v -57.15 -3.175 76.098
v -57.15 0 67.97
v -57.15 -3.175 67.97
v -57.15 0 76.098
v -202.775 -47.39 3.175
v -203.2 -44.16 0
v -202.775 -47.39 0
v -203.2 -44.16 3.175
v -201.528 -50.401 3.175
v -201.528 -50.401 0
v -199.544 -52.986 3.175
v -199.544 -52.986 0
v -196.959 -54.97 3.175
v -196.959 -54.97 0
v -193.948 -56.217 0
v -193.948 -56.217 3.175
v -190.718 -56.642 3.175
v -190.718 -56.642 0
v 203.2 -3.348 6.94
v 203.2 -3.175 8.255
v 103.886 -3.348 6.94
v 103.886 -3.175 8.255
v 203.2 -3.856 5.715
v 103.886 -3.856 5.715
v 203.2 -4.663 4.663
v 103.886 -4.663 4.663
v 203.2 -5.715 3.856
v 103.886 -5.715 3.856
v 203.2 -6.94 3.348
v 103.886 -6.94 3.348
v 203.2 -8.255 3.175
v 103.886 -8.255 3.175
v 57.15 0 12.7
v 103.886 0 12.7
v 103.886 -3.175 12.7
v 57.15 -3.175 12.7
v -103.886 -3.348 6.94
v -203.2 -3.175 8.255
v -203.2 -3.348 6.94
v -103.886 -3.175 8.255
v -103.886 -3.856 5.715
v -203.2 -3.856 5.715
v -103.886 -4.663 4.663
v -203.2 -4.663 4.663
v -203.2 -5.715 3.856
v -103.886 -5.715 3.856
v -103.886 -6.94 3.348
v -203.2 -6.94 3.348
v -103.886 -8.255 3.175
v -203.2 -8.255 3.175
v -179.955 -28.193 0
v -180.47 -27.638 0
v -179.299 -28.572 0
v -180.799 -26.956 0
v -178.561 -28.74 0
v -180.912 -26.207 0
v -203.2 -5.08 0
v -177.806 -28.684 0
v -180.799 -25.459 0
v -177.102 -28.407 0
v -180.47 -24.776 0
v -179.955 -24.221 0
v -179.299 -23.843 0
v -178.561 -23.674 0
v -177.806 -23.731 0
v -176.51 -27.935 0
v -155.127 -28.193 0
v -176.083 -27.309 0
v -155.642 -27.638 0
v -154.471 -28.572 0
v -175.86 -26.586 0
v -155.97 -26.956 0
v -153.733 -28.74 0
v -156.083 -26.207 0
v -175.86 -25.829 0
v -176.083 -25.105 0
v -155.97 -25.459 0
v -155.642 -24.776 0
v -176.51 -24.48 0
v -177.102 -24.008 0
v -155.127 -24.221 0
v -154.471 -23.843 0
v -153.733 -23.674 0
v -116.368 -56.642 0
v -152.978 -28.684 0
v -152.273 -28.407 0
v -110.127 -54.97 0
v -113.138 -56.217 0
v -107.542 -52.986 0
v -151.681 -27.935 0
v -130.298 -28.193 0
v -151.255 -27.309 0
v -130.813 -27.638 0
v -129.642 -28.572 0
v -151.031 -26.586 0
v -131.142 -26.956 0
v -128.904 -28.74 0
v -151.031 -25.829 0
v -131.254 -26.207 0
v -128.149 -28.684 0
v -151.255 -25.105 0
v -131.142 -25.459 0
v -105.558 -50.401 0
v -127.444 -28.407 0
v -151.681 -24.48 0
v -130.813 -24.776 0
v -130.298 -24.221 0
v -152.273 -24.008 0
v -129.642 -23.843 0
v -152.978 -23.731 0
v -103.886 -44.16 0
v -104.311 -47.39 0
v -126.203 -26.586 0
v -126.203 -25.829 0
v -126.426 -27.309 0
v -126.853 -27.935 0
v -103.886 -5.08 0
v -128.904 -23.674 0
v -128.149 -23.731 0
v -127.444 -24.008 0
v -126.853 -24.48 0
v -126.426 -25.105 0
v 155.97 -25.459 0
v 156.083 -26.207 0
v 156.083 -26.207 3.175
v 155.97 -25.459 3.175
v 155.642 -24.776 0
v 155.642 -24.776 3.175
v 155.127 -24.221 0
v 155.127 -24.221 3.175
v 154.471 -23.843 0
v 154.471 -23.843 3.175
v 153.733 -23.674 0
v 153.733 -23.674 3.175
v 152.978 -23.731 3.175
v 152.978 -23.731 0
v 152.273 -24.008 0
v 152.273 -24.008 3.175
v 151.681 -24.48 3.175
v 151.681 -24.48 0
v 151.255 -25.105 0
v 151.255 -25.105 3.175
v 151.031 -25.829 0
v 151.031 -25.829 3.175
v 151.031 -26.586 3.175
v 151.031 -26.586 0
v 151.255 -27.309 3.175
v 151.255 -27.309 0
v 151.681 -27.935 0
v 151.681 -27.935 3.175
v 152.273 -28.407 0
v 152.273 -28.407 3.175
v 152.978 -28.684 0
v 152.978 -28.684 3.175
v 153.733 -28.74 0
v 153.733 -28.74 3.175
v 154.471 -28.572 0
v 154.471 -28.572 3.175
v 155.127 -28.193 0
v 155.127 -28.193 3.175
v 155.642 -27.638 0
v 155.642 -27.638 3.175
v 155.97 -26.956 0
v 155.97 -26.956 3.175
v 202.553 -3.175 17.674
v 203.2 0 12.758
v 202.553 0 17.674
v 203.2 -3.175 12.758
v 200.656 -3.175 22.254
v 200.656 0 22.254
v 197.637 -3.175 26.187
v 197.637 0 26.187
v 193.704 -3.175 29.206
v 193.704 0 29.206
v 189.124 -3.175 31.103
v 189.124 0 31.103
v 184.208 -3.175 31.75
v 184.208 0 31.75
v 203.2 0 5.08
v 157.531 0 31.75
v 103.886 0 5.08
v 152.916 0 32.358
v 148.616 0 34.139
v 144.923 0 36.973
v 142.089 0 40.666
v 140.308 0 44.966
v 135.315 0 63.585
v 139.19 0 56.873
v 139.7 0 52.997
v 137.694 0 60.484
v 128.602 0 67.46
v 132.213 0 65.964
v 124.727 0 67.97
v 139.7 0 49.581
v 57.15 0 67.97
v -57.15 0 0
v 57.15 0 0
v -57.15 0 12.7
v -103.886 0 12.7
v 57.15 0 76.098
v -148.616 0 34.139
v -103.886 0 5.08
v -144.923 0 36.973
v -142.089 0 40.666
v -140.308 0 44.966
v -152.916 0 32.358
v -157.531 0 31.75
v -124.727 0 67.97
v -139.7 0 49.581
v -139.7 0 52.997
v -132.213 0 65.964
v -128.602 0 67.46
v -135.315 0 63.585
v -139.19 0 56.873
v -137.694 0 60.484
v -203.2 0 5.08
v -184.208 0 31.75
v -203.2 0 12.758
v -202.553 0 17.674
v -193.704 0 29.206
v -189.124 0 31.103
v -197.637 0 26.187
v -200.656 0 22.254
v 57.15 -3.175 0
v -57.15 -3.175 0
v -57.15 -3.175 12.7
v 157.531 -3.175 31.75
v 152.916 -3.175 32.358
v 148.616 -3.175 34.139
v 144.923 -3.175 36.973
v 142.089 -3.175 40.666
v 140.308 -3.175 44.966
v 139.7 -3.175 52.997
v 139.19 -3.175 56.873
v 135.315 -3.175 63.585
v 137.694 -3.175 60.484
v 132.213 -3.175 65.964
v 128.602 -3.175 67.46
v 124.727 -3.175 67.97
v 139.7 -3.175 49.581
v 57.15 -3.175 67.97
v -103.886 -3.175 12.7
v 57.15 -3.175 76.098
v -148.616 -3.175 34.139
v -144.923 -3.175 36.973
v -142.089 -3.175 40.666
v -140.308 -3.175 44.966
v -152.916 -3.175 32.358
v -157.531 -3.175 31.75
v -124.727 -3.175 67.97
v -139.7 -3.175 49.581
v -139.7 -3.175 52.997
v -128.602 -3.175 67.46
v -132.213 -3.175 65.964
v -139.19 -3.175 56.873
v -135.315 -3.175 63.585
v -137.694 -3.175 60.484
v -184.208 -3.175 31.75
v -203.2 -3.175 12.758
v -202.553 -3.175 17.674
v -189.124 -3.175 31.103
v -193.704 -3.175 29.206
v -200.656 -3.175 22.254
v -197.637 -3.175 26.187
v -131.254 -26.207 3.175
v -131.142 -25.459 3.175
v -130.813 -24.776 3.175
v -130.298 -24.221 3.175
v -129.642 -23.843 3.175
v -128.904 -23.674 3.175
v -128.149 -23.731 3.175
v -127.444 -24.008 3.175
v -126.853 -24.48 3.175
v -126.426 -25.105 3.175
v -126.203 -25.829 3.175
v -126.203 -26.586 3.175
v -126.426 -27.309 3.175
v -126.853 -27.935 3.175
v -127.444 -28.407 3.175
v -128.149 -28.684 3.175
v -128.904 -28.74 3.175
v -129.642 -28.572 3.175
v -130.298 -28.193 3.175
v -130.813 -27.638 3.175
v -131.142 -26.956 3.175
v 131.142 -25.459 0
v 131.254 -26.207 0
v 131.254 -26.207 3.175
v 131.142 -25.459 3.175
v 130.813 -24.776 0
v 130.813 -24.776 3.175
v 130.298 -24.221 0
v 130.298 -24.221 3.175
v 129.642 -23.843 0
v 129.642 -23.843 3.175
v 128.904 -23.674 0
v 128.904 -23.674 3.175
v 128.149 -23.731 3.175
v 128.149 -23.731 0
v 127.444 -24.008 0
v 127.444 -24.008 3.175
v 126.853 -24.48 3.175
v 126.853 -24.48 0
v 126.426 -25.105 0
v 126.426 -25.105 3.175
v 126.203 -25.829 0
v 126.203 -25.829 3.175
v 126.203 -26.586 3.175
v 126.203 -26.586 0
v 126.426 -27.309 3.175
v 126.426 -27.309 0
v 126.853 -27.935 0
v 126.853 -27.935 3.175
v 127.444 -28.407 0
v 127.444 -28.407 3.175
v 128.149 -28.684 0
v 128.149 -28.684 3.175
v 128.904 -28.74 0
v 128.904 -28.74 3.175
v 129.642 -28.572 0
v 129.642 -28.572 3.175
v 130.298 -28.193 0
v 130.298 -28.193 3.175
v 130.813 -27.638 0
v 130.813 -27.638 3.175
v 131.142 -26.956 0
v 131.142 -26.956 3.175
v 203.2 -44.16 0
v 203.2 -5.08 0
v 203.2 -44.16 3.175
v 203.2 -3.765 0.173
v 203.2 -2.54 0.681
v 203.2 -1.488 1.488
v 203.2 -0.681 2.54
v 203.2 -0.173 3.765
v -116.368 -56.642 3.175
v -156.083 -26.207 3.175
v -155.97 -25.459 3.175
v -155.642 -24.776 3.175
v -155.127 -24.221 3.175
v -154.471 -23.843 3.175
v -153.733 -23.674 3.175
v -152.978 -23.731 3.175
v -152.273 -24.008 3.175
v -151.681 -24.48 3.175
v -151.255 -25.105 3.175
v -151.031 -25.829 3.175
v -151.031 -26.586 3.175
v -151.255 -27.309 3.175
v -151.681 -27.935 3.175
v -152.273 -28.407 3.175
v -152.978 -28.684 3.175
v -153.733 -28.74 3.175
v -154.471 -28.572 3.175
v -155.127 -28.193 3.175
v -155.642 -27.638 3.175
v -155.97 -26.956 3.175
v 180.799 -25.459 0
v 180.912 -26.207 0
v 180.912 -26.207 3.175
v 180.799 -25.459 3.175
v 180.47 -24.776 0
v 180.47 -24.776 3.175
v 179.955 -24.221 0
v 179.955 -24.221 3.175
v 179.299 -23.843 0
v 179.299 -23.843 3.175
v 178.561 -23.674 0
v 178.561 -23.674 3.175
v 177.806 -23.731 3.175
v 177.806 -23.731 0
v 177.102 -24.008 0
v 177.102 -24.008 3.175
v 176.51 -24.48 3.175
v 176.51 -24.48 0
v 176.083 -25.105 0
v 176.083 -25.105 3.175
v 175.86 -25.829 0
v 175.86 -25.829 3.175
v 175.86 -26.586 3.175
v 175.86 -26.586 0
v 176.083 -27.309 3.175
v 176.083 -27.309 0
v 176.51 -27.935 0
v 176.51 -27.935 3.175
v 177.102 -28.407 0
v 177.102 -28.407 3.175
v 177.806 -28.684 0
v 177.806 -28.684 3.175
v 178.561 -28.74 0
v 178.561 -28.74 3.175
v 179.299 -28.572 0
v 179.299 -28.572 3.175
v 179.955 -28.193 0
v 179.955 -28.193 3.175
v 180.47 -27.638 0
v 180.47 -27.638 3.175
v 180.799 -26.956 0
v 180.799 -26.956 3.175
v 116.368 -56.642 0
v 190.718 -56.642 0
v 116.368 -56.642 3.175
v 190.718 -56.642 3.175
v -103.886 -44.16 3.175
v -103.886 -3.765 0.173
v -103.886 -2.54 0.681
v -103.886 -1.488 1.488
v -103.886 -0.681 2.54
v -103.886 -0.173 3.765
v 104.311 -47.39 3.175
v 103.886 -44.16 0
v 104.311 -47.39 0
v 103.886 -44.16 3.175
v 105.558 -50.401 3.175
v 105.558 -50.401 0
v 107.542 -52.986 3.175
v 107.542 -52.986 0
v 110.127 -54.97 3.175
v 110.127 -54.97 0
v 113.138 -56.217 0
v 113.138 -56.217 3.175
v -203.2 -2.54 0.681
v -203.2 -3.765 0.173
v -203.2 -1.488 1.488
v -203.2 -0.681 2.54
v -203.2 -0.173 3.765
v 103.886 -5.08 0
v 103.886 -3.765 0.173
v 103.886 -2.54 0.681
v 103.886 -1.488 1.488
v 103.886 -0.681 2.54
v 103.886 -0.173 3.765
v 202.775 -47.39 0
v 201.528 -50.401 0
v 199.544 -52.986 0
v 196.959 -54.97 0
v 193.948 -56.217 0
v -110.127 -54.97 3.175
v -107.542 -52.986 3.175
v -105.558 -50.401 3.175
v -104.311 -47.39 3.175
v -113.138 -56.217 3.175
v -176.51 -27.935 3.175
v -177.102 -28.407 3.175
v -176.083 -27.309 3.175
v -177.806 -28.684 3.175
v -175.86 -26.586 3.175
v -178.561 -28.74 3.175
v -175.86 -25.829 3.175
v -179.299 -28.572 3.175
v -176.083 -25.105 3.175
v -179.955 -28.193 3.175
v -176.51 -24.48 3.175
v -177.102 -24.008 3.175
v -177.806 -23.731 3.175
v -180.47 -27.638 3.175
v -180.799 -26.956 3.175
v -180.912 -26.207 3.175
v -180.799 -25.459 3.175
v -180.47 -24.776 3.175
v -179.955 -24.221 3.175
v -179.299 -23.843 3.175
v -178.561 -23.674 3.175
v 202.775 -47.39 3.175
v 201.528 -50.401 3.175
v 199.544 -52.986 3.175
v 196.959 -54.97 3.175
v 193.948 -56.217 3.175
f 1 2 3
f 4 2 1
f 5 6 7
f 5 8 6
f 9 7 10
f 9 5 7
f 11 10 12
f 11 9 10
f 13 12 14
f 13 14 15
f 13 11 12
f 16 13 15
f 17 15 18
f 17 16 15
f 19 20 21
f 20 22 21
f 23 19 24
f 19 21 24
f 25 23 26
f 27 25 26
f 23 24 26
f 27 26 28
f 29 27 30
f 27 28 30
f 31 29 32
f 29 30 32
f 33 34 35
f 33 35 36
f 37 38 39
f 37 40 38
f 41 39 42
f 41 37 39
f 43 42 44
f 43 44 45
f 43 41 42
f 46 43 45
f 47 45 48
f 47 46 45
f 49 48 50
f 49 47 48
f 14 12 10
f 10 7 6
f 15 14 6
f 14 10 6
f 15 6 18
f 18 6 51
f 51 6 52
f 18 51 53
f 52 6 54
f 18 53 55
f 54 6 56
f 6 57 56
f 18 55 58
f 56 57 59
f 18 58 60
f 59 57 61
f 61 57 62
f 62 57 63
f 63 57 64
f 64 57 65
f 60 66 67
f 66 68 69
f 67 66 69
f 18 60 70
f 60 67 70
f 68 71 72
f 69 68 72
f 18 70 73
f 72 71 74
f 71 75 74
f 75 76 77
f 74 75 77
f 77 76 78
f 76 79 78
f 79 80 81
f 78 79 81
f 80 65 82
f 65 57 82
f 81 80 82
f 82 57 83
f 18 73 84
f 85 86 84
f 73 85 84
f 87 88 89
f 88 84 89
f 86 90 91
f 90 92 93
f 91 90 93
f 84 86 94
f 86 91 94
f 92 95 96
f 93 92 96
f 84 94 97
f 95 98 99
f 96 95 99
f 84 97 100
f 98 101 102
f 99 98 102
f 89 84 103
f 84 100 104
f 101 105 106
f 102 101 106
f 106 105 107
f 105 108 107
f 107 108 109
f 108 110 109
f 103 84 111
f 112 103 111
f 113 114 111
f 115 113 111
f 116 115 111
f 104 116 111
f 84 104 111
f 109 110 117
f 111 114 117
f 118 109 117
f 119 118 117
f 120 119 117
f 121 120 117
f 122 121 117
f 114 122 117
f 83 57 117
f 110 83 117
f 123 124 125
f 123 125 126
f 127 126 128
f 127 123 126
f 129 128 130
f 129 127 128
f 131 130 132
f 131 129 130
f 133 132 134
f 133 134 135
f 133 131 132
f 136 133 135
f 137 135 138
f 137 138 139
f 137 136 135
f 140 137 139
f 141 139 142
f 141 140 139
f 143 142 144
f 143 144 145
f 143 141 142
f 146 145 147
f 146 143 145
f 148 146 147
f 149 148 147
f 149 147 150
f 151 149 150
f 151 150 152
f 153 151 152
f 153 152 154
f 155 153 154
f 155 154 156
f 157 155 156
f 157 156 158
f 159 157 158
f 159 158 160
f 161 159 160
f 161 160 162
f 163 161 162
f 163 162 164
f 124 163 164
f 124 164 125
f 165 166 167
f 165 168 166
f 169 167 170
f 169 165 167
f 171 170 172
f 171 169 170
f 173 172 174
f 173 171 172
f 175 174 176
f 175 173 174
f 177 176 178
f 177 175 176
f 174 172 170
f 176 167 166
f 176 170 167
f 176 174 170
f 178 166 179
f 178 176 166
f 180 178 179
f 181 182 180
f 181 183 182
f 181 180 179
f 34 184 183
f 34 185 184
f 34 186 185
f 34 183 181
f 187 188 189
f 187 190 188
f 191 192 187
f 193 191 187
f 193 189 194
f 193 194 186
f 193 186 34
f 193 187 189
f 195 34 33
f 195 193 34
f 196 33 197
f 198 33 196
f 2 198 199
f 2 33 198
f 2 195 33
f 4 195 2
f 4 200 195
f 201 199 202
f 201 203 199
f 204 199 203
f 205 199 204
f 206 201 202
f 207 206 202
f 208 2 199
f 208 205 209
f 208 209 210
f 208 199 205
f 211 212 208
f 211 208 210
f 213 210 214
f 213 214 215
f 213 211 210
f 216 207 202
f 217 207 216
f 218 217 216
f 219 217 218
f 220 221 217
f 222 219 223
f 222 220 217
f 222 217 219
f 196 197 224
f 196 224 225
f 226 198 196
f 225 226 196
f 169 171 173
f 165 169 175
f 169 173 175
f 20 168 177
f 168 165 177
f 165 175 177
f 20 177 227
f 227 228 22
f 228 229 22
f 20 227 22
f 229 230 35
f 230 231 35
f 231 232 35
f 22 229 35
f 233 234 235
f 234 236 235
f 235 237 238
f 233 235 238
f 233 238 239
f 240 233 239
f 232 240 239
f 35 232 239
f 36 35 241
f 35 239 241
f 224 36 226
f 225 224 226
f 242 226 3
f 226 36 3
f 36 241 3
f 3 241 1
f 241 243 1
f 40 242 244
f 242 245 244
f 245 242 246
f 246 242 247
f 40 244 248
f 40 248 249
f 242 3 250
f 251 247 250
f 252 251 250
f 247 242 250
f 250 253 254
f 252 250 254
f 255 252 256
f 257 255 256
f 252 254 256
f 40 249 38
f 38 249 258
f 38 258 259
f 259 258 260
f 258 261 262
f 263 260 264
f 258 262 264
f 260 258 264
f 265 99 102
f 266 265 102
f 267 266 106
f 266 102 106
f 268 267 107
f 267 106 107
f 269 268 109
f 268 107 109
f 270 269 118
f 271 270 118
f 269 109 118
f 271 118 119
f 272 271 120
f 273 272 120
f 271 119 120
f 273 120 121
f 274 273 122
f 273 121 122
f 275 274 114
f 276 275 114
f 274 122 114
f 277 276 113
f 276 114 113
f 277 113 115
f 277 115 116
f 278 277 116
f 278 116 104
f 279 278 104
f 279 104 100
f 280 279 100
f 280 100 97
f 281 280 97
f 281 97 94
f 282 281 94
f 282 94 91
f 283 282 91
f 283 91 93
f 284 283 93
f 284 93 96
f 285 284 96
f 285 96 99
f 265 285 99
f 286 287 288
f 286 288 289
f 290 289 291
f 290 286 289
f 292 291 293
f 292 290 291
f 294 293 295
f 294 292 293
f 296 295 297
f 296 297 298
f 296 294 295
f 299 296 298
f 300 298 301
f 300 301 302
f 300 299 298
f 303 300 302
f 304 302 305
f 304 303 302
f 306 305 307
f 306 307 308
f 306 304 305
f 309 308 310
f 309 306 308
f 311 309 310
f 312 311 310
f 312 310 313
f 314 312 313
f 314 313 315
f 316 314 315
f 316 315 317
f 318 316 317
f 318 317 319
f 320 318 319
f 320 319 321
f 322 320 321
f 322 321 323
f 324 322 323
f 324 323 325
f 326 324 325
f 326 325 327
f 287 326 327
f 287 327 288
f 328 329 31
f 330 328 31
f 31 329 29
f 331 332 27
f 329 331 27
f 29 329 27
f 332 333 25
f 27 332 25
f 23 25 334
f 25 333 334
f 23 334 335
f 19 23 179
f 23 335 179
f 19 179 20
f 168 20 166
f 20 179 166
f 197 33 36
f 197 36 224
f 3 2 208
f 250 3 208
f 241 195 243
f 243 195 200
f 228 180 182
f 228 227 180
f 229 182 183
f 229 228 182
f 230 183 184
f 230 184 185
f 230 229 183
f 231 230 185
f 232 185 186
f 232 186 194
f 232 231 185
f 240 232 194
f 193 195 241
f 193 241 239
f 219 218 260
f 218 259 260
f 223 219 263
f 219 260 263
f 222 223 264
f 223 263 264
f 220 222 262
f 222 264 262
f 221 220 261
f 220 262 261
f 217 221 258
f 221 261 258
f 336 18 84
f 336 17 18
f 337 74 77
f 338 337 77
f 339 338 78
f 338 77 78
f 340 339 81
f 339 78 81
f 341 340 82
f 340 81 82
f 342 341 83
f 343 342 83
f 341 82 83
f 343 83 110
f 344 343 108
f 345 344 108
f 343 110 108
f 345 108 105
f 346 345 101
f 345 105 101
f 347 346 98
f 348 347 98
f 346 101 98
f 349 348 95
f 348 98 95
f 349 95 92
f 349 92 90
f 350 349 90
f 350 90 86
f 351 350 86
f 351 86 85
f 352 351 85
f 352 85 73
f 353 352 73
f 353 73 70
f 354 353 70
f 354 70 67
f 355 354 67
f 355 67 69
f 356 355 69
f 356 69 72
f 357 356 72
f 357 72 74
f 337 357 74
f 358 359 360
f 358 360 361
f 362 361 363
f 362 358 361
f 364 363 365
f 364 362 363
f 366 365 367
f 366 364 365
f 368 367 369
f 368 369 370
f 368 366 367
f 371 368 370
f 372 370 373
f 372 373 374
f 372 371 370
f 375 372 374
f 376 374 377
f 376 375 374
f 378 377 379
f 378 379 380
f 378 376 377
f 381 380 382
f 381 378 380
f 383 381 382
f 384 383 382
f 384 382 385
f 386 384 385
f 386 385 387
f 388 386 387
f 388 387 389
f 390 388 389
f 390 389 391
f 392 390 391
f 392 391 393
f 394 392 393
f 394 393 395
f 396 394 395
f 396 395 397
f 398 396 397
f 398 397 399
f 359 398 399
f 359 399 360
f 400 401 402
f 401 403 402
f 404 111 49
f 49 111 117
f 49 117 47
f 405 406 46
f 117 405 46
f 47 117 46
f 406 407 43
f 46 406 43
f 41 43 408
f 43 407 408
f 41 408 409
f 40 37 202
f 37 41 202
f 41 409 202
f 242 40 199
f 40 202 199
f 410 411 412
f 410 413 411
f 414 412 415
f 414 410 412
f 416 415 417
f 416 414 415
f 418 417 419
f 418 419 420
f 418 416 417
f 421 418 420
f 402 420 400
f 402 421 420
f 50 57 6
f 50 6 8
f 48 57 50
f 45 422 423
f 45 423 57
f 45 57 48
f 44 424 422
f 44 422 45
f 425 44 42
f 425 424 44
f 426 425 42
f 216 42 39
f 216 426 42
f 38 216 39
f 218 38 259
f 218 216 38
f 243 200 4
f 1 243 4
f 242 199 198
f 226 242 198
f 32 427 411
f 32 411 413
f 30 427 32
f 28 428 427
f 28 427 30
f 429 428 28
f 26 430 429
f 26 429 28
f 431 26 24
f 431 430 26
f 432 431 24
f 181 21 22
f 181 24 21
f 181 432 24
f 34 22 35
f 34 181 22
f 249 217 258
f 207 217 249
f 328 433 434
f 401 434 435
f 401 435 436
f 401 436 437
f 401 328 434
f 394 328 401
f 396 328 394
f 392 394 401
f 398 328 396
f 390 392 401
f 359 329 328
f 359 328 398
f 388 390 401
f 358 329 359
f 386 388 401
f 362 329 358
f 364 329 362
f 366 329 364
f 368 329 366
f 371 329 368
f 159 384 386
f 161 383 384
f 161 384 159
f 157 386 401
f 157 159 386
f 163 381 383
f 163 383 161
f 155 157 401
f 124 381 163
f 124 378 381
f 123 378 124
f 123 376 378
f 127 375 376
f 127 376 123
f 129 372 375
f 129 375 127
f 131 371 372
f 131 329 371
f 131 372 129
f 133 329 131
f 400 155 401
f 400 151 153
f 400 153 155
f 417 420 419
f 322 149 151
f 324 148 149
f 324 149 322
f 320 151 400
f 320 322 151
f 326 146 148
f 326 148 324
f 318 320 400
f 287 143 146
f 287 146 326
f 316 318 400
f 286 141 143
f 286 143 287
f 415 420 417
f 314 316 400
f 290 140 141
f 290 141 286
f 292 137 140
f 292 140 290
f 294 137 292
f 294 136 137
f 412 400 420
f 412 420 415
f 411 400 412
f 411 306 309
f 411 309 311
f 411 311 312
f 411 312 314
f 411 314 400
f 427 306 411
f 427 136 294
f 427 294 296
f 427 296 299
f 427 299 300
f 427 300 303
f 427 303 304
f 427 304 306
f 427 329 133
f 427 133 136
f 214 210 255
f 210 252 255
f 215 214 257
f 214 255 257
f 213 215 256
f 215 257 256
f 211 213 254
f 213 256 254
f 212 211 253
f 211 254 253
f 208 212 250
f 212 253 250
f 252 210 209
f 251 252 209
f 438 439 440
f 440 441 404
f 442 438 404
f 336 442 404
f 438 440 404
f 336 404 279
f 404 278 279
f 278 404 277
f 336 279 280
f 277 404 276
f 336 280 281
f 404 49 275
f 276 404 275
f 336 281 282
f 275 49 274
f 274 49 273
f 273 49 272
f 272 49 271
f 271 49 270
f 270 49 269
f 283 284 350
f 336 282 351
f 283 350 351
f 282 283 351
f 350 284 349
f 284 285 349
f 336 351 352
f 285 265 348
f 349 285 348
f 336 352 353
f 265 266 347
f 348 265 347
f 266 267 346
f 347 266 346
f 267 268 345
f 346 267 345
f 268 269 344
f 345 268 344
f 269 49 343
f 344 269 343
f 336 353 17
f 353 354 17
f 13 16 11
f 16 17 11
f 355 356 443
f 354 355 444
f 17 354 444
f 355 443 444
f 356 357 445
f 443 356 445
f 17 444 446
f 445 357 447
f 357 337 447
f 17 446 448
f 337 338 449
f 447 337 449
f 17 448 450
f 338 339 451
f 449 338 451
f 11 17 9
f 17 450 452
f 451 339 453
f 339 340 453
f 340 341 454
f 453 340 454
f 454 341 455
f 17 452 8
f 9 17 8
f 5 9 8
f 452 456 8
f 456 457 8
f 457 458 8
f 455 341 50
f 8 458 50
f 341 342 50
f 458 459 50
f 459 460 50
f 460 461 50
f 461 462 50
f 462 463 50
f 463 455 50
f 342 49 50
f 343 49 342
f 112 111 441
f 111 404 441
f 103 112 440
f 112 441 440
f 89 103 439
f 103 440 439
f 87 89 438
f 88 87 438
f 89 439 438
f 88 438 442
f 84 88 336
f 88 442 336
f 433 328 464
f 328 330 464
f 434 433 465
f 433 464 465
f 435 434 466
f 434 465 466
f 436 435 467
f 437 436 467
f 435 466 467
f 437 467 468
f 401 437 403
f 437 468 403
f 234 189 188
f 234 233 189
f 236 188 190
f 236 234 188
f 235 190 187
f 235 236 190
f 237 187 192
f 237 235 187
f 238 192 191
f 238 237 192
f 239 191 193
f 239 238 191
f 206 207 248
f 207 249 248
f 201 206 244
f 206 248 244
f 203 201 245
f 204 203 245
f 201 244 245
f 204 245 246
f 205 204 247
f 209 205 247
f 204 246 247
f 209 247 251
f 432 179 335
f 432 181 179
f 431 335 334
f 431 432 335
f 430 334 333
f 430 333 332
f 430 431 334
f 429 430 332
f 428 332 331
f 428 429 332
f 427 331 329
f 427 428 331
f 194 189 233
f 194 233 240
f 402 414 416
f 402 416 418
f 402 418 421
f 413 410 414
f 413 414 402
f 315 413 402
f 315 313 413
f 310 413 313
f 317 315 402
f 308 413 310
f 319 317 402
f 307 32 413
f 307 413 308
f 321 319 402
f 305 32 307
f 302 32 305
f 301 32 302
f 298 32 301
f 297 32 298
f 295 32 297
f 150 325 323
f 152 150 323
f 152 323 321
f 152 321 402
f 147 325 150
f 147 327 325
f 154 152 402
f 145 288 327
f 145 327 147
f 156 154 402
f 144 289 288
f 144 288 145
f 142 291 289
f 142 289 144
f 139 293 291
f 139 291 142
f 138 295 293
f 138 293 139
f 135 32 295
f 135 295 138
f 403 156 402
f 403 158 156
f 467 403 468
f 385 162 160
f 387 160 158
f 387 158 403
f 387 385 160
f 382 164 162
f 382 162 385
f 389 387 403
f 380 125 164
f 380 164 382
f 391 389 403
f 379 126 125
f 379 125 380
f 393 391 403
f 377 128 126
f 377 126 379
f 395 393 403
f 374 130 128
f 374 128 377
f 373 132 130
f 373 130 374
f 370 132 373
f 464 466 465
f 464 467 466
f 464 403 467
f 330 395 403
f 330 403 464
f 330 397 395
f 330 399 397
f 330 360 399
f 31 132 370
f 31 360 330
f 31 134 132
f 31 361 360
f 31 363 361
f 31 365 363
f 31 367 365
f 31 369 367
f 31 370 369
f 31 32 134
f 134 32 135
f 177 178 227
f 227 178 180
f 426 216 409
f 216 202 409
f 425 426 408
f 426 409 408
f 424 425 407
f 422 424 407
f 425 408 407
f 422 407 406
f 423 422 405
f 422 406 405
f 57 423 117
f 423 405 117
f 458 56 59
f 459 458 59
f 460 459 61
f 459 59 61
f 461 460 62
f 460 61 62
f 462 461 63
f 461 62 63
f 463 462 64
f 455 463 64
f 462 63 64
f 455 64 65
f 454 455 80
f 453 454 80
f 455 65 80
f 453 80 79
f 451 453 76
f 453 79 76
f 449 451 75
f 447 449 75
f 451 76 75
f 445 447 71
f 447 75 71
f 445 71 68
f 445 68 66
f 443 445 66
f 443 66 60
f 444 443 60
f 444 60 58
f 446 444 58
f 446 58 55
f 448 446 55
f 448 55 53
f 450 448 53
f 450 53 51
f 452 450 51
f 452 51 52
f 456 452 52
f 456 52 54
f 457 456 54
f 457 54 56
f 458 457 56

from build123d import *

# Parameters (mm, degrees)
F0_W     = 63.5
F0_H     = 28.575
F0_W_2   = 46.736
F0_H_2   = 27.6352
F0_W_3   = 57.15
F0_H_3   = 8.128
F1_DEPTH = 3.175
F0_H_4   = 3.175
F0_W_4   = 35.814
F2_DEPTH = 56.642
F3_R     = 18.991869689
F4_R     = 17.8311640925
F5_R     = 14.9730007981
F6_R     = 5.08
F7_R     = 12.4823532344
F9_D     = 5.08
F9_DEPTH = 25.4
F9_TIP   = 1.5261859723


# Not quite as in the source:
# - a feature names something its author has since deleted; it is built from what else it names


with BuildPart() as f1:
    # F0 (on Front) → F1 (new body)
    with BuildSketch(Plane.XZ):
        with Locations((-171.45, 17.4625)):
            Rectangle(F0_W, F0_H)
        Polygon((-57.15, 0), (0, 0), (0, 40.3352), (-57.15, 40.3352), (-57.15, 12.7), align=None)
        with Locations((-80.518, 26.5176)):
            Rectangle(F0_W_2, F0_H_2)
        with Locations((-80.518, 54.1528)):
            Rectangle(F0_W_2, F0_H_2)
        Polygon((-103.886, 3.175), (-103.886, 12.7), (-103.886, 40.3352), (-103.886, 67.9704), (-139.7, 67.9704), (-139.7, 31.75), (-139.7, 3.175), align=None)
        with Locations((-28.575, 54.1528)):
            Rectangle(F0_W_3, F0_H_2)
        with Locations((-28.575, 72.0344)):
            Rectangle(F0_W_3, F0_H_3)
    extrude(amount=F1_DEPTH)

    # F0 (on Front) → F2 (join)
    with BuildSketch(Plane.XZ):
        with Locations((-171.45, 1.5875)):
            Rectangle(F0_W, F0_H_4)
        with Locations((-121.793, 1.5875)):
            Rectangle(F0_W_4, F0_H_4)
    extrude(amount=F2_DEPTH)

    # F3
    f3_edges = [f1.edges().sort_by_distance(p)[0] for p in [
        (-203.2, -1.5875, 31.75),
    ]]
    fillet(f3_edges, radius=F3_R)

    # F4
    f4_edges = [f1.edges().sort_by_distance(p)[0] for p in [
        (-139.7, -1.5875, 31.75),
    ]]
    fillet(f4_edges, radius=F4_R)

    # F5
    f5_edges = [f1.edges().sort_by_distance(p)[0] for p in [
        (-139.7, -1.5875, 67.9704),
    ]]
    fillet(f5_edges, radius=F5_R)

    # F6
    f6_edges = [f1.edges().sort_by_distance(p)[0] for p in [
        (-153.543, 0, 0),
        (-153.543, -3.175, 3.175),
    ]]
    fillet(f6_edges, radius=F6_R)

    # F7
    f7_edges = [f1.edges().sort_by_distance(p)[0] for p in [
        (-103.886, -56.642, 1.5875),
        (-203.2, -56.642, 1.5875),
    ]]
    fillet(f7_edges, radius=F7_R)

    # F9
    with Locations(Plane.XY.offset(3.175)):
        with Locations((-153.543, -26.2073233828), (-128.7145, -26.2073233828), (-178.3715, -26.2073233828)):
            Hole(F9_D / 2, depth=F9_DEPTH)
            with Locations((0, 0, -(F9_DEPTH + F9_TIP / 2))):  # 118° drill point
                Cone(0, F9_D / 2, F9_TIP, mode=Mode.SUBTRACT)

    # F10: F1 across face


with BuildPart() as f1_1:
    add(f1.part)
    add(f1.part.mirror(Plane(origin=(0, -1.5875, 38.0492), x_dir=(0, 1, 0), z_dir=(1, 0, 0))))


solid = f1_1.part
